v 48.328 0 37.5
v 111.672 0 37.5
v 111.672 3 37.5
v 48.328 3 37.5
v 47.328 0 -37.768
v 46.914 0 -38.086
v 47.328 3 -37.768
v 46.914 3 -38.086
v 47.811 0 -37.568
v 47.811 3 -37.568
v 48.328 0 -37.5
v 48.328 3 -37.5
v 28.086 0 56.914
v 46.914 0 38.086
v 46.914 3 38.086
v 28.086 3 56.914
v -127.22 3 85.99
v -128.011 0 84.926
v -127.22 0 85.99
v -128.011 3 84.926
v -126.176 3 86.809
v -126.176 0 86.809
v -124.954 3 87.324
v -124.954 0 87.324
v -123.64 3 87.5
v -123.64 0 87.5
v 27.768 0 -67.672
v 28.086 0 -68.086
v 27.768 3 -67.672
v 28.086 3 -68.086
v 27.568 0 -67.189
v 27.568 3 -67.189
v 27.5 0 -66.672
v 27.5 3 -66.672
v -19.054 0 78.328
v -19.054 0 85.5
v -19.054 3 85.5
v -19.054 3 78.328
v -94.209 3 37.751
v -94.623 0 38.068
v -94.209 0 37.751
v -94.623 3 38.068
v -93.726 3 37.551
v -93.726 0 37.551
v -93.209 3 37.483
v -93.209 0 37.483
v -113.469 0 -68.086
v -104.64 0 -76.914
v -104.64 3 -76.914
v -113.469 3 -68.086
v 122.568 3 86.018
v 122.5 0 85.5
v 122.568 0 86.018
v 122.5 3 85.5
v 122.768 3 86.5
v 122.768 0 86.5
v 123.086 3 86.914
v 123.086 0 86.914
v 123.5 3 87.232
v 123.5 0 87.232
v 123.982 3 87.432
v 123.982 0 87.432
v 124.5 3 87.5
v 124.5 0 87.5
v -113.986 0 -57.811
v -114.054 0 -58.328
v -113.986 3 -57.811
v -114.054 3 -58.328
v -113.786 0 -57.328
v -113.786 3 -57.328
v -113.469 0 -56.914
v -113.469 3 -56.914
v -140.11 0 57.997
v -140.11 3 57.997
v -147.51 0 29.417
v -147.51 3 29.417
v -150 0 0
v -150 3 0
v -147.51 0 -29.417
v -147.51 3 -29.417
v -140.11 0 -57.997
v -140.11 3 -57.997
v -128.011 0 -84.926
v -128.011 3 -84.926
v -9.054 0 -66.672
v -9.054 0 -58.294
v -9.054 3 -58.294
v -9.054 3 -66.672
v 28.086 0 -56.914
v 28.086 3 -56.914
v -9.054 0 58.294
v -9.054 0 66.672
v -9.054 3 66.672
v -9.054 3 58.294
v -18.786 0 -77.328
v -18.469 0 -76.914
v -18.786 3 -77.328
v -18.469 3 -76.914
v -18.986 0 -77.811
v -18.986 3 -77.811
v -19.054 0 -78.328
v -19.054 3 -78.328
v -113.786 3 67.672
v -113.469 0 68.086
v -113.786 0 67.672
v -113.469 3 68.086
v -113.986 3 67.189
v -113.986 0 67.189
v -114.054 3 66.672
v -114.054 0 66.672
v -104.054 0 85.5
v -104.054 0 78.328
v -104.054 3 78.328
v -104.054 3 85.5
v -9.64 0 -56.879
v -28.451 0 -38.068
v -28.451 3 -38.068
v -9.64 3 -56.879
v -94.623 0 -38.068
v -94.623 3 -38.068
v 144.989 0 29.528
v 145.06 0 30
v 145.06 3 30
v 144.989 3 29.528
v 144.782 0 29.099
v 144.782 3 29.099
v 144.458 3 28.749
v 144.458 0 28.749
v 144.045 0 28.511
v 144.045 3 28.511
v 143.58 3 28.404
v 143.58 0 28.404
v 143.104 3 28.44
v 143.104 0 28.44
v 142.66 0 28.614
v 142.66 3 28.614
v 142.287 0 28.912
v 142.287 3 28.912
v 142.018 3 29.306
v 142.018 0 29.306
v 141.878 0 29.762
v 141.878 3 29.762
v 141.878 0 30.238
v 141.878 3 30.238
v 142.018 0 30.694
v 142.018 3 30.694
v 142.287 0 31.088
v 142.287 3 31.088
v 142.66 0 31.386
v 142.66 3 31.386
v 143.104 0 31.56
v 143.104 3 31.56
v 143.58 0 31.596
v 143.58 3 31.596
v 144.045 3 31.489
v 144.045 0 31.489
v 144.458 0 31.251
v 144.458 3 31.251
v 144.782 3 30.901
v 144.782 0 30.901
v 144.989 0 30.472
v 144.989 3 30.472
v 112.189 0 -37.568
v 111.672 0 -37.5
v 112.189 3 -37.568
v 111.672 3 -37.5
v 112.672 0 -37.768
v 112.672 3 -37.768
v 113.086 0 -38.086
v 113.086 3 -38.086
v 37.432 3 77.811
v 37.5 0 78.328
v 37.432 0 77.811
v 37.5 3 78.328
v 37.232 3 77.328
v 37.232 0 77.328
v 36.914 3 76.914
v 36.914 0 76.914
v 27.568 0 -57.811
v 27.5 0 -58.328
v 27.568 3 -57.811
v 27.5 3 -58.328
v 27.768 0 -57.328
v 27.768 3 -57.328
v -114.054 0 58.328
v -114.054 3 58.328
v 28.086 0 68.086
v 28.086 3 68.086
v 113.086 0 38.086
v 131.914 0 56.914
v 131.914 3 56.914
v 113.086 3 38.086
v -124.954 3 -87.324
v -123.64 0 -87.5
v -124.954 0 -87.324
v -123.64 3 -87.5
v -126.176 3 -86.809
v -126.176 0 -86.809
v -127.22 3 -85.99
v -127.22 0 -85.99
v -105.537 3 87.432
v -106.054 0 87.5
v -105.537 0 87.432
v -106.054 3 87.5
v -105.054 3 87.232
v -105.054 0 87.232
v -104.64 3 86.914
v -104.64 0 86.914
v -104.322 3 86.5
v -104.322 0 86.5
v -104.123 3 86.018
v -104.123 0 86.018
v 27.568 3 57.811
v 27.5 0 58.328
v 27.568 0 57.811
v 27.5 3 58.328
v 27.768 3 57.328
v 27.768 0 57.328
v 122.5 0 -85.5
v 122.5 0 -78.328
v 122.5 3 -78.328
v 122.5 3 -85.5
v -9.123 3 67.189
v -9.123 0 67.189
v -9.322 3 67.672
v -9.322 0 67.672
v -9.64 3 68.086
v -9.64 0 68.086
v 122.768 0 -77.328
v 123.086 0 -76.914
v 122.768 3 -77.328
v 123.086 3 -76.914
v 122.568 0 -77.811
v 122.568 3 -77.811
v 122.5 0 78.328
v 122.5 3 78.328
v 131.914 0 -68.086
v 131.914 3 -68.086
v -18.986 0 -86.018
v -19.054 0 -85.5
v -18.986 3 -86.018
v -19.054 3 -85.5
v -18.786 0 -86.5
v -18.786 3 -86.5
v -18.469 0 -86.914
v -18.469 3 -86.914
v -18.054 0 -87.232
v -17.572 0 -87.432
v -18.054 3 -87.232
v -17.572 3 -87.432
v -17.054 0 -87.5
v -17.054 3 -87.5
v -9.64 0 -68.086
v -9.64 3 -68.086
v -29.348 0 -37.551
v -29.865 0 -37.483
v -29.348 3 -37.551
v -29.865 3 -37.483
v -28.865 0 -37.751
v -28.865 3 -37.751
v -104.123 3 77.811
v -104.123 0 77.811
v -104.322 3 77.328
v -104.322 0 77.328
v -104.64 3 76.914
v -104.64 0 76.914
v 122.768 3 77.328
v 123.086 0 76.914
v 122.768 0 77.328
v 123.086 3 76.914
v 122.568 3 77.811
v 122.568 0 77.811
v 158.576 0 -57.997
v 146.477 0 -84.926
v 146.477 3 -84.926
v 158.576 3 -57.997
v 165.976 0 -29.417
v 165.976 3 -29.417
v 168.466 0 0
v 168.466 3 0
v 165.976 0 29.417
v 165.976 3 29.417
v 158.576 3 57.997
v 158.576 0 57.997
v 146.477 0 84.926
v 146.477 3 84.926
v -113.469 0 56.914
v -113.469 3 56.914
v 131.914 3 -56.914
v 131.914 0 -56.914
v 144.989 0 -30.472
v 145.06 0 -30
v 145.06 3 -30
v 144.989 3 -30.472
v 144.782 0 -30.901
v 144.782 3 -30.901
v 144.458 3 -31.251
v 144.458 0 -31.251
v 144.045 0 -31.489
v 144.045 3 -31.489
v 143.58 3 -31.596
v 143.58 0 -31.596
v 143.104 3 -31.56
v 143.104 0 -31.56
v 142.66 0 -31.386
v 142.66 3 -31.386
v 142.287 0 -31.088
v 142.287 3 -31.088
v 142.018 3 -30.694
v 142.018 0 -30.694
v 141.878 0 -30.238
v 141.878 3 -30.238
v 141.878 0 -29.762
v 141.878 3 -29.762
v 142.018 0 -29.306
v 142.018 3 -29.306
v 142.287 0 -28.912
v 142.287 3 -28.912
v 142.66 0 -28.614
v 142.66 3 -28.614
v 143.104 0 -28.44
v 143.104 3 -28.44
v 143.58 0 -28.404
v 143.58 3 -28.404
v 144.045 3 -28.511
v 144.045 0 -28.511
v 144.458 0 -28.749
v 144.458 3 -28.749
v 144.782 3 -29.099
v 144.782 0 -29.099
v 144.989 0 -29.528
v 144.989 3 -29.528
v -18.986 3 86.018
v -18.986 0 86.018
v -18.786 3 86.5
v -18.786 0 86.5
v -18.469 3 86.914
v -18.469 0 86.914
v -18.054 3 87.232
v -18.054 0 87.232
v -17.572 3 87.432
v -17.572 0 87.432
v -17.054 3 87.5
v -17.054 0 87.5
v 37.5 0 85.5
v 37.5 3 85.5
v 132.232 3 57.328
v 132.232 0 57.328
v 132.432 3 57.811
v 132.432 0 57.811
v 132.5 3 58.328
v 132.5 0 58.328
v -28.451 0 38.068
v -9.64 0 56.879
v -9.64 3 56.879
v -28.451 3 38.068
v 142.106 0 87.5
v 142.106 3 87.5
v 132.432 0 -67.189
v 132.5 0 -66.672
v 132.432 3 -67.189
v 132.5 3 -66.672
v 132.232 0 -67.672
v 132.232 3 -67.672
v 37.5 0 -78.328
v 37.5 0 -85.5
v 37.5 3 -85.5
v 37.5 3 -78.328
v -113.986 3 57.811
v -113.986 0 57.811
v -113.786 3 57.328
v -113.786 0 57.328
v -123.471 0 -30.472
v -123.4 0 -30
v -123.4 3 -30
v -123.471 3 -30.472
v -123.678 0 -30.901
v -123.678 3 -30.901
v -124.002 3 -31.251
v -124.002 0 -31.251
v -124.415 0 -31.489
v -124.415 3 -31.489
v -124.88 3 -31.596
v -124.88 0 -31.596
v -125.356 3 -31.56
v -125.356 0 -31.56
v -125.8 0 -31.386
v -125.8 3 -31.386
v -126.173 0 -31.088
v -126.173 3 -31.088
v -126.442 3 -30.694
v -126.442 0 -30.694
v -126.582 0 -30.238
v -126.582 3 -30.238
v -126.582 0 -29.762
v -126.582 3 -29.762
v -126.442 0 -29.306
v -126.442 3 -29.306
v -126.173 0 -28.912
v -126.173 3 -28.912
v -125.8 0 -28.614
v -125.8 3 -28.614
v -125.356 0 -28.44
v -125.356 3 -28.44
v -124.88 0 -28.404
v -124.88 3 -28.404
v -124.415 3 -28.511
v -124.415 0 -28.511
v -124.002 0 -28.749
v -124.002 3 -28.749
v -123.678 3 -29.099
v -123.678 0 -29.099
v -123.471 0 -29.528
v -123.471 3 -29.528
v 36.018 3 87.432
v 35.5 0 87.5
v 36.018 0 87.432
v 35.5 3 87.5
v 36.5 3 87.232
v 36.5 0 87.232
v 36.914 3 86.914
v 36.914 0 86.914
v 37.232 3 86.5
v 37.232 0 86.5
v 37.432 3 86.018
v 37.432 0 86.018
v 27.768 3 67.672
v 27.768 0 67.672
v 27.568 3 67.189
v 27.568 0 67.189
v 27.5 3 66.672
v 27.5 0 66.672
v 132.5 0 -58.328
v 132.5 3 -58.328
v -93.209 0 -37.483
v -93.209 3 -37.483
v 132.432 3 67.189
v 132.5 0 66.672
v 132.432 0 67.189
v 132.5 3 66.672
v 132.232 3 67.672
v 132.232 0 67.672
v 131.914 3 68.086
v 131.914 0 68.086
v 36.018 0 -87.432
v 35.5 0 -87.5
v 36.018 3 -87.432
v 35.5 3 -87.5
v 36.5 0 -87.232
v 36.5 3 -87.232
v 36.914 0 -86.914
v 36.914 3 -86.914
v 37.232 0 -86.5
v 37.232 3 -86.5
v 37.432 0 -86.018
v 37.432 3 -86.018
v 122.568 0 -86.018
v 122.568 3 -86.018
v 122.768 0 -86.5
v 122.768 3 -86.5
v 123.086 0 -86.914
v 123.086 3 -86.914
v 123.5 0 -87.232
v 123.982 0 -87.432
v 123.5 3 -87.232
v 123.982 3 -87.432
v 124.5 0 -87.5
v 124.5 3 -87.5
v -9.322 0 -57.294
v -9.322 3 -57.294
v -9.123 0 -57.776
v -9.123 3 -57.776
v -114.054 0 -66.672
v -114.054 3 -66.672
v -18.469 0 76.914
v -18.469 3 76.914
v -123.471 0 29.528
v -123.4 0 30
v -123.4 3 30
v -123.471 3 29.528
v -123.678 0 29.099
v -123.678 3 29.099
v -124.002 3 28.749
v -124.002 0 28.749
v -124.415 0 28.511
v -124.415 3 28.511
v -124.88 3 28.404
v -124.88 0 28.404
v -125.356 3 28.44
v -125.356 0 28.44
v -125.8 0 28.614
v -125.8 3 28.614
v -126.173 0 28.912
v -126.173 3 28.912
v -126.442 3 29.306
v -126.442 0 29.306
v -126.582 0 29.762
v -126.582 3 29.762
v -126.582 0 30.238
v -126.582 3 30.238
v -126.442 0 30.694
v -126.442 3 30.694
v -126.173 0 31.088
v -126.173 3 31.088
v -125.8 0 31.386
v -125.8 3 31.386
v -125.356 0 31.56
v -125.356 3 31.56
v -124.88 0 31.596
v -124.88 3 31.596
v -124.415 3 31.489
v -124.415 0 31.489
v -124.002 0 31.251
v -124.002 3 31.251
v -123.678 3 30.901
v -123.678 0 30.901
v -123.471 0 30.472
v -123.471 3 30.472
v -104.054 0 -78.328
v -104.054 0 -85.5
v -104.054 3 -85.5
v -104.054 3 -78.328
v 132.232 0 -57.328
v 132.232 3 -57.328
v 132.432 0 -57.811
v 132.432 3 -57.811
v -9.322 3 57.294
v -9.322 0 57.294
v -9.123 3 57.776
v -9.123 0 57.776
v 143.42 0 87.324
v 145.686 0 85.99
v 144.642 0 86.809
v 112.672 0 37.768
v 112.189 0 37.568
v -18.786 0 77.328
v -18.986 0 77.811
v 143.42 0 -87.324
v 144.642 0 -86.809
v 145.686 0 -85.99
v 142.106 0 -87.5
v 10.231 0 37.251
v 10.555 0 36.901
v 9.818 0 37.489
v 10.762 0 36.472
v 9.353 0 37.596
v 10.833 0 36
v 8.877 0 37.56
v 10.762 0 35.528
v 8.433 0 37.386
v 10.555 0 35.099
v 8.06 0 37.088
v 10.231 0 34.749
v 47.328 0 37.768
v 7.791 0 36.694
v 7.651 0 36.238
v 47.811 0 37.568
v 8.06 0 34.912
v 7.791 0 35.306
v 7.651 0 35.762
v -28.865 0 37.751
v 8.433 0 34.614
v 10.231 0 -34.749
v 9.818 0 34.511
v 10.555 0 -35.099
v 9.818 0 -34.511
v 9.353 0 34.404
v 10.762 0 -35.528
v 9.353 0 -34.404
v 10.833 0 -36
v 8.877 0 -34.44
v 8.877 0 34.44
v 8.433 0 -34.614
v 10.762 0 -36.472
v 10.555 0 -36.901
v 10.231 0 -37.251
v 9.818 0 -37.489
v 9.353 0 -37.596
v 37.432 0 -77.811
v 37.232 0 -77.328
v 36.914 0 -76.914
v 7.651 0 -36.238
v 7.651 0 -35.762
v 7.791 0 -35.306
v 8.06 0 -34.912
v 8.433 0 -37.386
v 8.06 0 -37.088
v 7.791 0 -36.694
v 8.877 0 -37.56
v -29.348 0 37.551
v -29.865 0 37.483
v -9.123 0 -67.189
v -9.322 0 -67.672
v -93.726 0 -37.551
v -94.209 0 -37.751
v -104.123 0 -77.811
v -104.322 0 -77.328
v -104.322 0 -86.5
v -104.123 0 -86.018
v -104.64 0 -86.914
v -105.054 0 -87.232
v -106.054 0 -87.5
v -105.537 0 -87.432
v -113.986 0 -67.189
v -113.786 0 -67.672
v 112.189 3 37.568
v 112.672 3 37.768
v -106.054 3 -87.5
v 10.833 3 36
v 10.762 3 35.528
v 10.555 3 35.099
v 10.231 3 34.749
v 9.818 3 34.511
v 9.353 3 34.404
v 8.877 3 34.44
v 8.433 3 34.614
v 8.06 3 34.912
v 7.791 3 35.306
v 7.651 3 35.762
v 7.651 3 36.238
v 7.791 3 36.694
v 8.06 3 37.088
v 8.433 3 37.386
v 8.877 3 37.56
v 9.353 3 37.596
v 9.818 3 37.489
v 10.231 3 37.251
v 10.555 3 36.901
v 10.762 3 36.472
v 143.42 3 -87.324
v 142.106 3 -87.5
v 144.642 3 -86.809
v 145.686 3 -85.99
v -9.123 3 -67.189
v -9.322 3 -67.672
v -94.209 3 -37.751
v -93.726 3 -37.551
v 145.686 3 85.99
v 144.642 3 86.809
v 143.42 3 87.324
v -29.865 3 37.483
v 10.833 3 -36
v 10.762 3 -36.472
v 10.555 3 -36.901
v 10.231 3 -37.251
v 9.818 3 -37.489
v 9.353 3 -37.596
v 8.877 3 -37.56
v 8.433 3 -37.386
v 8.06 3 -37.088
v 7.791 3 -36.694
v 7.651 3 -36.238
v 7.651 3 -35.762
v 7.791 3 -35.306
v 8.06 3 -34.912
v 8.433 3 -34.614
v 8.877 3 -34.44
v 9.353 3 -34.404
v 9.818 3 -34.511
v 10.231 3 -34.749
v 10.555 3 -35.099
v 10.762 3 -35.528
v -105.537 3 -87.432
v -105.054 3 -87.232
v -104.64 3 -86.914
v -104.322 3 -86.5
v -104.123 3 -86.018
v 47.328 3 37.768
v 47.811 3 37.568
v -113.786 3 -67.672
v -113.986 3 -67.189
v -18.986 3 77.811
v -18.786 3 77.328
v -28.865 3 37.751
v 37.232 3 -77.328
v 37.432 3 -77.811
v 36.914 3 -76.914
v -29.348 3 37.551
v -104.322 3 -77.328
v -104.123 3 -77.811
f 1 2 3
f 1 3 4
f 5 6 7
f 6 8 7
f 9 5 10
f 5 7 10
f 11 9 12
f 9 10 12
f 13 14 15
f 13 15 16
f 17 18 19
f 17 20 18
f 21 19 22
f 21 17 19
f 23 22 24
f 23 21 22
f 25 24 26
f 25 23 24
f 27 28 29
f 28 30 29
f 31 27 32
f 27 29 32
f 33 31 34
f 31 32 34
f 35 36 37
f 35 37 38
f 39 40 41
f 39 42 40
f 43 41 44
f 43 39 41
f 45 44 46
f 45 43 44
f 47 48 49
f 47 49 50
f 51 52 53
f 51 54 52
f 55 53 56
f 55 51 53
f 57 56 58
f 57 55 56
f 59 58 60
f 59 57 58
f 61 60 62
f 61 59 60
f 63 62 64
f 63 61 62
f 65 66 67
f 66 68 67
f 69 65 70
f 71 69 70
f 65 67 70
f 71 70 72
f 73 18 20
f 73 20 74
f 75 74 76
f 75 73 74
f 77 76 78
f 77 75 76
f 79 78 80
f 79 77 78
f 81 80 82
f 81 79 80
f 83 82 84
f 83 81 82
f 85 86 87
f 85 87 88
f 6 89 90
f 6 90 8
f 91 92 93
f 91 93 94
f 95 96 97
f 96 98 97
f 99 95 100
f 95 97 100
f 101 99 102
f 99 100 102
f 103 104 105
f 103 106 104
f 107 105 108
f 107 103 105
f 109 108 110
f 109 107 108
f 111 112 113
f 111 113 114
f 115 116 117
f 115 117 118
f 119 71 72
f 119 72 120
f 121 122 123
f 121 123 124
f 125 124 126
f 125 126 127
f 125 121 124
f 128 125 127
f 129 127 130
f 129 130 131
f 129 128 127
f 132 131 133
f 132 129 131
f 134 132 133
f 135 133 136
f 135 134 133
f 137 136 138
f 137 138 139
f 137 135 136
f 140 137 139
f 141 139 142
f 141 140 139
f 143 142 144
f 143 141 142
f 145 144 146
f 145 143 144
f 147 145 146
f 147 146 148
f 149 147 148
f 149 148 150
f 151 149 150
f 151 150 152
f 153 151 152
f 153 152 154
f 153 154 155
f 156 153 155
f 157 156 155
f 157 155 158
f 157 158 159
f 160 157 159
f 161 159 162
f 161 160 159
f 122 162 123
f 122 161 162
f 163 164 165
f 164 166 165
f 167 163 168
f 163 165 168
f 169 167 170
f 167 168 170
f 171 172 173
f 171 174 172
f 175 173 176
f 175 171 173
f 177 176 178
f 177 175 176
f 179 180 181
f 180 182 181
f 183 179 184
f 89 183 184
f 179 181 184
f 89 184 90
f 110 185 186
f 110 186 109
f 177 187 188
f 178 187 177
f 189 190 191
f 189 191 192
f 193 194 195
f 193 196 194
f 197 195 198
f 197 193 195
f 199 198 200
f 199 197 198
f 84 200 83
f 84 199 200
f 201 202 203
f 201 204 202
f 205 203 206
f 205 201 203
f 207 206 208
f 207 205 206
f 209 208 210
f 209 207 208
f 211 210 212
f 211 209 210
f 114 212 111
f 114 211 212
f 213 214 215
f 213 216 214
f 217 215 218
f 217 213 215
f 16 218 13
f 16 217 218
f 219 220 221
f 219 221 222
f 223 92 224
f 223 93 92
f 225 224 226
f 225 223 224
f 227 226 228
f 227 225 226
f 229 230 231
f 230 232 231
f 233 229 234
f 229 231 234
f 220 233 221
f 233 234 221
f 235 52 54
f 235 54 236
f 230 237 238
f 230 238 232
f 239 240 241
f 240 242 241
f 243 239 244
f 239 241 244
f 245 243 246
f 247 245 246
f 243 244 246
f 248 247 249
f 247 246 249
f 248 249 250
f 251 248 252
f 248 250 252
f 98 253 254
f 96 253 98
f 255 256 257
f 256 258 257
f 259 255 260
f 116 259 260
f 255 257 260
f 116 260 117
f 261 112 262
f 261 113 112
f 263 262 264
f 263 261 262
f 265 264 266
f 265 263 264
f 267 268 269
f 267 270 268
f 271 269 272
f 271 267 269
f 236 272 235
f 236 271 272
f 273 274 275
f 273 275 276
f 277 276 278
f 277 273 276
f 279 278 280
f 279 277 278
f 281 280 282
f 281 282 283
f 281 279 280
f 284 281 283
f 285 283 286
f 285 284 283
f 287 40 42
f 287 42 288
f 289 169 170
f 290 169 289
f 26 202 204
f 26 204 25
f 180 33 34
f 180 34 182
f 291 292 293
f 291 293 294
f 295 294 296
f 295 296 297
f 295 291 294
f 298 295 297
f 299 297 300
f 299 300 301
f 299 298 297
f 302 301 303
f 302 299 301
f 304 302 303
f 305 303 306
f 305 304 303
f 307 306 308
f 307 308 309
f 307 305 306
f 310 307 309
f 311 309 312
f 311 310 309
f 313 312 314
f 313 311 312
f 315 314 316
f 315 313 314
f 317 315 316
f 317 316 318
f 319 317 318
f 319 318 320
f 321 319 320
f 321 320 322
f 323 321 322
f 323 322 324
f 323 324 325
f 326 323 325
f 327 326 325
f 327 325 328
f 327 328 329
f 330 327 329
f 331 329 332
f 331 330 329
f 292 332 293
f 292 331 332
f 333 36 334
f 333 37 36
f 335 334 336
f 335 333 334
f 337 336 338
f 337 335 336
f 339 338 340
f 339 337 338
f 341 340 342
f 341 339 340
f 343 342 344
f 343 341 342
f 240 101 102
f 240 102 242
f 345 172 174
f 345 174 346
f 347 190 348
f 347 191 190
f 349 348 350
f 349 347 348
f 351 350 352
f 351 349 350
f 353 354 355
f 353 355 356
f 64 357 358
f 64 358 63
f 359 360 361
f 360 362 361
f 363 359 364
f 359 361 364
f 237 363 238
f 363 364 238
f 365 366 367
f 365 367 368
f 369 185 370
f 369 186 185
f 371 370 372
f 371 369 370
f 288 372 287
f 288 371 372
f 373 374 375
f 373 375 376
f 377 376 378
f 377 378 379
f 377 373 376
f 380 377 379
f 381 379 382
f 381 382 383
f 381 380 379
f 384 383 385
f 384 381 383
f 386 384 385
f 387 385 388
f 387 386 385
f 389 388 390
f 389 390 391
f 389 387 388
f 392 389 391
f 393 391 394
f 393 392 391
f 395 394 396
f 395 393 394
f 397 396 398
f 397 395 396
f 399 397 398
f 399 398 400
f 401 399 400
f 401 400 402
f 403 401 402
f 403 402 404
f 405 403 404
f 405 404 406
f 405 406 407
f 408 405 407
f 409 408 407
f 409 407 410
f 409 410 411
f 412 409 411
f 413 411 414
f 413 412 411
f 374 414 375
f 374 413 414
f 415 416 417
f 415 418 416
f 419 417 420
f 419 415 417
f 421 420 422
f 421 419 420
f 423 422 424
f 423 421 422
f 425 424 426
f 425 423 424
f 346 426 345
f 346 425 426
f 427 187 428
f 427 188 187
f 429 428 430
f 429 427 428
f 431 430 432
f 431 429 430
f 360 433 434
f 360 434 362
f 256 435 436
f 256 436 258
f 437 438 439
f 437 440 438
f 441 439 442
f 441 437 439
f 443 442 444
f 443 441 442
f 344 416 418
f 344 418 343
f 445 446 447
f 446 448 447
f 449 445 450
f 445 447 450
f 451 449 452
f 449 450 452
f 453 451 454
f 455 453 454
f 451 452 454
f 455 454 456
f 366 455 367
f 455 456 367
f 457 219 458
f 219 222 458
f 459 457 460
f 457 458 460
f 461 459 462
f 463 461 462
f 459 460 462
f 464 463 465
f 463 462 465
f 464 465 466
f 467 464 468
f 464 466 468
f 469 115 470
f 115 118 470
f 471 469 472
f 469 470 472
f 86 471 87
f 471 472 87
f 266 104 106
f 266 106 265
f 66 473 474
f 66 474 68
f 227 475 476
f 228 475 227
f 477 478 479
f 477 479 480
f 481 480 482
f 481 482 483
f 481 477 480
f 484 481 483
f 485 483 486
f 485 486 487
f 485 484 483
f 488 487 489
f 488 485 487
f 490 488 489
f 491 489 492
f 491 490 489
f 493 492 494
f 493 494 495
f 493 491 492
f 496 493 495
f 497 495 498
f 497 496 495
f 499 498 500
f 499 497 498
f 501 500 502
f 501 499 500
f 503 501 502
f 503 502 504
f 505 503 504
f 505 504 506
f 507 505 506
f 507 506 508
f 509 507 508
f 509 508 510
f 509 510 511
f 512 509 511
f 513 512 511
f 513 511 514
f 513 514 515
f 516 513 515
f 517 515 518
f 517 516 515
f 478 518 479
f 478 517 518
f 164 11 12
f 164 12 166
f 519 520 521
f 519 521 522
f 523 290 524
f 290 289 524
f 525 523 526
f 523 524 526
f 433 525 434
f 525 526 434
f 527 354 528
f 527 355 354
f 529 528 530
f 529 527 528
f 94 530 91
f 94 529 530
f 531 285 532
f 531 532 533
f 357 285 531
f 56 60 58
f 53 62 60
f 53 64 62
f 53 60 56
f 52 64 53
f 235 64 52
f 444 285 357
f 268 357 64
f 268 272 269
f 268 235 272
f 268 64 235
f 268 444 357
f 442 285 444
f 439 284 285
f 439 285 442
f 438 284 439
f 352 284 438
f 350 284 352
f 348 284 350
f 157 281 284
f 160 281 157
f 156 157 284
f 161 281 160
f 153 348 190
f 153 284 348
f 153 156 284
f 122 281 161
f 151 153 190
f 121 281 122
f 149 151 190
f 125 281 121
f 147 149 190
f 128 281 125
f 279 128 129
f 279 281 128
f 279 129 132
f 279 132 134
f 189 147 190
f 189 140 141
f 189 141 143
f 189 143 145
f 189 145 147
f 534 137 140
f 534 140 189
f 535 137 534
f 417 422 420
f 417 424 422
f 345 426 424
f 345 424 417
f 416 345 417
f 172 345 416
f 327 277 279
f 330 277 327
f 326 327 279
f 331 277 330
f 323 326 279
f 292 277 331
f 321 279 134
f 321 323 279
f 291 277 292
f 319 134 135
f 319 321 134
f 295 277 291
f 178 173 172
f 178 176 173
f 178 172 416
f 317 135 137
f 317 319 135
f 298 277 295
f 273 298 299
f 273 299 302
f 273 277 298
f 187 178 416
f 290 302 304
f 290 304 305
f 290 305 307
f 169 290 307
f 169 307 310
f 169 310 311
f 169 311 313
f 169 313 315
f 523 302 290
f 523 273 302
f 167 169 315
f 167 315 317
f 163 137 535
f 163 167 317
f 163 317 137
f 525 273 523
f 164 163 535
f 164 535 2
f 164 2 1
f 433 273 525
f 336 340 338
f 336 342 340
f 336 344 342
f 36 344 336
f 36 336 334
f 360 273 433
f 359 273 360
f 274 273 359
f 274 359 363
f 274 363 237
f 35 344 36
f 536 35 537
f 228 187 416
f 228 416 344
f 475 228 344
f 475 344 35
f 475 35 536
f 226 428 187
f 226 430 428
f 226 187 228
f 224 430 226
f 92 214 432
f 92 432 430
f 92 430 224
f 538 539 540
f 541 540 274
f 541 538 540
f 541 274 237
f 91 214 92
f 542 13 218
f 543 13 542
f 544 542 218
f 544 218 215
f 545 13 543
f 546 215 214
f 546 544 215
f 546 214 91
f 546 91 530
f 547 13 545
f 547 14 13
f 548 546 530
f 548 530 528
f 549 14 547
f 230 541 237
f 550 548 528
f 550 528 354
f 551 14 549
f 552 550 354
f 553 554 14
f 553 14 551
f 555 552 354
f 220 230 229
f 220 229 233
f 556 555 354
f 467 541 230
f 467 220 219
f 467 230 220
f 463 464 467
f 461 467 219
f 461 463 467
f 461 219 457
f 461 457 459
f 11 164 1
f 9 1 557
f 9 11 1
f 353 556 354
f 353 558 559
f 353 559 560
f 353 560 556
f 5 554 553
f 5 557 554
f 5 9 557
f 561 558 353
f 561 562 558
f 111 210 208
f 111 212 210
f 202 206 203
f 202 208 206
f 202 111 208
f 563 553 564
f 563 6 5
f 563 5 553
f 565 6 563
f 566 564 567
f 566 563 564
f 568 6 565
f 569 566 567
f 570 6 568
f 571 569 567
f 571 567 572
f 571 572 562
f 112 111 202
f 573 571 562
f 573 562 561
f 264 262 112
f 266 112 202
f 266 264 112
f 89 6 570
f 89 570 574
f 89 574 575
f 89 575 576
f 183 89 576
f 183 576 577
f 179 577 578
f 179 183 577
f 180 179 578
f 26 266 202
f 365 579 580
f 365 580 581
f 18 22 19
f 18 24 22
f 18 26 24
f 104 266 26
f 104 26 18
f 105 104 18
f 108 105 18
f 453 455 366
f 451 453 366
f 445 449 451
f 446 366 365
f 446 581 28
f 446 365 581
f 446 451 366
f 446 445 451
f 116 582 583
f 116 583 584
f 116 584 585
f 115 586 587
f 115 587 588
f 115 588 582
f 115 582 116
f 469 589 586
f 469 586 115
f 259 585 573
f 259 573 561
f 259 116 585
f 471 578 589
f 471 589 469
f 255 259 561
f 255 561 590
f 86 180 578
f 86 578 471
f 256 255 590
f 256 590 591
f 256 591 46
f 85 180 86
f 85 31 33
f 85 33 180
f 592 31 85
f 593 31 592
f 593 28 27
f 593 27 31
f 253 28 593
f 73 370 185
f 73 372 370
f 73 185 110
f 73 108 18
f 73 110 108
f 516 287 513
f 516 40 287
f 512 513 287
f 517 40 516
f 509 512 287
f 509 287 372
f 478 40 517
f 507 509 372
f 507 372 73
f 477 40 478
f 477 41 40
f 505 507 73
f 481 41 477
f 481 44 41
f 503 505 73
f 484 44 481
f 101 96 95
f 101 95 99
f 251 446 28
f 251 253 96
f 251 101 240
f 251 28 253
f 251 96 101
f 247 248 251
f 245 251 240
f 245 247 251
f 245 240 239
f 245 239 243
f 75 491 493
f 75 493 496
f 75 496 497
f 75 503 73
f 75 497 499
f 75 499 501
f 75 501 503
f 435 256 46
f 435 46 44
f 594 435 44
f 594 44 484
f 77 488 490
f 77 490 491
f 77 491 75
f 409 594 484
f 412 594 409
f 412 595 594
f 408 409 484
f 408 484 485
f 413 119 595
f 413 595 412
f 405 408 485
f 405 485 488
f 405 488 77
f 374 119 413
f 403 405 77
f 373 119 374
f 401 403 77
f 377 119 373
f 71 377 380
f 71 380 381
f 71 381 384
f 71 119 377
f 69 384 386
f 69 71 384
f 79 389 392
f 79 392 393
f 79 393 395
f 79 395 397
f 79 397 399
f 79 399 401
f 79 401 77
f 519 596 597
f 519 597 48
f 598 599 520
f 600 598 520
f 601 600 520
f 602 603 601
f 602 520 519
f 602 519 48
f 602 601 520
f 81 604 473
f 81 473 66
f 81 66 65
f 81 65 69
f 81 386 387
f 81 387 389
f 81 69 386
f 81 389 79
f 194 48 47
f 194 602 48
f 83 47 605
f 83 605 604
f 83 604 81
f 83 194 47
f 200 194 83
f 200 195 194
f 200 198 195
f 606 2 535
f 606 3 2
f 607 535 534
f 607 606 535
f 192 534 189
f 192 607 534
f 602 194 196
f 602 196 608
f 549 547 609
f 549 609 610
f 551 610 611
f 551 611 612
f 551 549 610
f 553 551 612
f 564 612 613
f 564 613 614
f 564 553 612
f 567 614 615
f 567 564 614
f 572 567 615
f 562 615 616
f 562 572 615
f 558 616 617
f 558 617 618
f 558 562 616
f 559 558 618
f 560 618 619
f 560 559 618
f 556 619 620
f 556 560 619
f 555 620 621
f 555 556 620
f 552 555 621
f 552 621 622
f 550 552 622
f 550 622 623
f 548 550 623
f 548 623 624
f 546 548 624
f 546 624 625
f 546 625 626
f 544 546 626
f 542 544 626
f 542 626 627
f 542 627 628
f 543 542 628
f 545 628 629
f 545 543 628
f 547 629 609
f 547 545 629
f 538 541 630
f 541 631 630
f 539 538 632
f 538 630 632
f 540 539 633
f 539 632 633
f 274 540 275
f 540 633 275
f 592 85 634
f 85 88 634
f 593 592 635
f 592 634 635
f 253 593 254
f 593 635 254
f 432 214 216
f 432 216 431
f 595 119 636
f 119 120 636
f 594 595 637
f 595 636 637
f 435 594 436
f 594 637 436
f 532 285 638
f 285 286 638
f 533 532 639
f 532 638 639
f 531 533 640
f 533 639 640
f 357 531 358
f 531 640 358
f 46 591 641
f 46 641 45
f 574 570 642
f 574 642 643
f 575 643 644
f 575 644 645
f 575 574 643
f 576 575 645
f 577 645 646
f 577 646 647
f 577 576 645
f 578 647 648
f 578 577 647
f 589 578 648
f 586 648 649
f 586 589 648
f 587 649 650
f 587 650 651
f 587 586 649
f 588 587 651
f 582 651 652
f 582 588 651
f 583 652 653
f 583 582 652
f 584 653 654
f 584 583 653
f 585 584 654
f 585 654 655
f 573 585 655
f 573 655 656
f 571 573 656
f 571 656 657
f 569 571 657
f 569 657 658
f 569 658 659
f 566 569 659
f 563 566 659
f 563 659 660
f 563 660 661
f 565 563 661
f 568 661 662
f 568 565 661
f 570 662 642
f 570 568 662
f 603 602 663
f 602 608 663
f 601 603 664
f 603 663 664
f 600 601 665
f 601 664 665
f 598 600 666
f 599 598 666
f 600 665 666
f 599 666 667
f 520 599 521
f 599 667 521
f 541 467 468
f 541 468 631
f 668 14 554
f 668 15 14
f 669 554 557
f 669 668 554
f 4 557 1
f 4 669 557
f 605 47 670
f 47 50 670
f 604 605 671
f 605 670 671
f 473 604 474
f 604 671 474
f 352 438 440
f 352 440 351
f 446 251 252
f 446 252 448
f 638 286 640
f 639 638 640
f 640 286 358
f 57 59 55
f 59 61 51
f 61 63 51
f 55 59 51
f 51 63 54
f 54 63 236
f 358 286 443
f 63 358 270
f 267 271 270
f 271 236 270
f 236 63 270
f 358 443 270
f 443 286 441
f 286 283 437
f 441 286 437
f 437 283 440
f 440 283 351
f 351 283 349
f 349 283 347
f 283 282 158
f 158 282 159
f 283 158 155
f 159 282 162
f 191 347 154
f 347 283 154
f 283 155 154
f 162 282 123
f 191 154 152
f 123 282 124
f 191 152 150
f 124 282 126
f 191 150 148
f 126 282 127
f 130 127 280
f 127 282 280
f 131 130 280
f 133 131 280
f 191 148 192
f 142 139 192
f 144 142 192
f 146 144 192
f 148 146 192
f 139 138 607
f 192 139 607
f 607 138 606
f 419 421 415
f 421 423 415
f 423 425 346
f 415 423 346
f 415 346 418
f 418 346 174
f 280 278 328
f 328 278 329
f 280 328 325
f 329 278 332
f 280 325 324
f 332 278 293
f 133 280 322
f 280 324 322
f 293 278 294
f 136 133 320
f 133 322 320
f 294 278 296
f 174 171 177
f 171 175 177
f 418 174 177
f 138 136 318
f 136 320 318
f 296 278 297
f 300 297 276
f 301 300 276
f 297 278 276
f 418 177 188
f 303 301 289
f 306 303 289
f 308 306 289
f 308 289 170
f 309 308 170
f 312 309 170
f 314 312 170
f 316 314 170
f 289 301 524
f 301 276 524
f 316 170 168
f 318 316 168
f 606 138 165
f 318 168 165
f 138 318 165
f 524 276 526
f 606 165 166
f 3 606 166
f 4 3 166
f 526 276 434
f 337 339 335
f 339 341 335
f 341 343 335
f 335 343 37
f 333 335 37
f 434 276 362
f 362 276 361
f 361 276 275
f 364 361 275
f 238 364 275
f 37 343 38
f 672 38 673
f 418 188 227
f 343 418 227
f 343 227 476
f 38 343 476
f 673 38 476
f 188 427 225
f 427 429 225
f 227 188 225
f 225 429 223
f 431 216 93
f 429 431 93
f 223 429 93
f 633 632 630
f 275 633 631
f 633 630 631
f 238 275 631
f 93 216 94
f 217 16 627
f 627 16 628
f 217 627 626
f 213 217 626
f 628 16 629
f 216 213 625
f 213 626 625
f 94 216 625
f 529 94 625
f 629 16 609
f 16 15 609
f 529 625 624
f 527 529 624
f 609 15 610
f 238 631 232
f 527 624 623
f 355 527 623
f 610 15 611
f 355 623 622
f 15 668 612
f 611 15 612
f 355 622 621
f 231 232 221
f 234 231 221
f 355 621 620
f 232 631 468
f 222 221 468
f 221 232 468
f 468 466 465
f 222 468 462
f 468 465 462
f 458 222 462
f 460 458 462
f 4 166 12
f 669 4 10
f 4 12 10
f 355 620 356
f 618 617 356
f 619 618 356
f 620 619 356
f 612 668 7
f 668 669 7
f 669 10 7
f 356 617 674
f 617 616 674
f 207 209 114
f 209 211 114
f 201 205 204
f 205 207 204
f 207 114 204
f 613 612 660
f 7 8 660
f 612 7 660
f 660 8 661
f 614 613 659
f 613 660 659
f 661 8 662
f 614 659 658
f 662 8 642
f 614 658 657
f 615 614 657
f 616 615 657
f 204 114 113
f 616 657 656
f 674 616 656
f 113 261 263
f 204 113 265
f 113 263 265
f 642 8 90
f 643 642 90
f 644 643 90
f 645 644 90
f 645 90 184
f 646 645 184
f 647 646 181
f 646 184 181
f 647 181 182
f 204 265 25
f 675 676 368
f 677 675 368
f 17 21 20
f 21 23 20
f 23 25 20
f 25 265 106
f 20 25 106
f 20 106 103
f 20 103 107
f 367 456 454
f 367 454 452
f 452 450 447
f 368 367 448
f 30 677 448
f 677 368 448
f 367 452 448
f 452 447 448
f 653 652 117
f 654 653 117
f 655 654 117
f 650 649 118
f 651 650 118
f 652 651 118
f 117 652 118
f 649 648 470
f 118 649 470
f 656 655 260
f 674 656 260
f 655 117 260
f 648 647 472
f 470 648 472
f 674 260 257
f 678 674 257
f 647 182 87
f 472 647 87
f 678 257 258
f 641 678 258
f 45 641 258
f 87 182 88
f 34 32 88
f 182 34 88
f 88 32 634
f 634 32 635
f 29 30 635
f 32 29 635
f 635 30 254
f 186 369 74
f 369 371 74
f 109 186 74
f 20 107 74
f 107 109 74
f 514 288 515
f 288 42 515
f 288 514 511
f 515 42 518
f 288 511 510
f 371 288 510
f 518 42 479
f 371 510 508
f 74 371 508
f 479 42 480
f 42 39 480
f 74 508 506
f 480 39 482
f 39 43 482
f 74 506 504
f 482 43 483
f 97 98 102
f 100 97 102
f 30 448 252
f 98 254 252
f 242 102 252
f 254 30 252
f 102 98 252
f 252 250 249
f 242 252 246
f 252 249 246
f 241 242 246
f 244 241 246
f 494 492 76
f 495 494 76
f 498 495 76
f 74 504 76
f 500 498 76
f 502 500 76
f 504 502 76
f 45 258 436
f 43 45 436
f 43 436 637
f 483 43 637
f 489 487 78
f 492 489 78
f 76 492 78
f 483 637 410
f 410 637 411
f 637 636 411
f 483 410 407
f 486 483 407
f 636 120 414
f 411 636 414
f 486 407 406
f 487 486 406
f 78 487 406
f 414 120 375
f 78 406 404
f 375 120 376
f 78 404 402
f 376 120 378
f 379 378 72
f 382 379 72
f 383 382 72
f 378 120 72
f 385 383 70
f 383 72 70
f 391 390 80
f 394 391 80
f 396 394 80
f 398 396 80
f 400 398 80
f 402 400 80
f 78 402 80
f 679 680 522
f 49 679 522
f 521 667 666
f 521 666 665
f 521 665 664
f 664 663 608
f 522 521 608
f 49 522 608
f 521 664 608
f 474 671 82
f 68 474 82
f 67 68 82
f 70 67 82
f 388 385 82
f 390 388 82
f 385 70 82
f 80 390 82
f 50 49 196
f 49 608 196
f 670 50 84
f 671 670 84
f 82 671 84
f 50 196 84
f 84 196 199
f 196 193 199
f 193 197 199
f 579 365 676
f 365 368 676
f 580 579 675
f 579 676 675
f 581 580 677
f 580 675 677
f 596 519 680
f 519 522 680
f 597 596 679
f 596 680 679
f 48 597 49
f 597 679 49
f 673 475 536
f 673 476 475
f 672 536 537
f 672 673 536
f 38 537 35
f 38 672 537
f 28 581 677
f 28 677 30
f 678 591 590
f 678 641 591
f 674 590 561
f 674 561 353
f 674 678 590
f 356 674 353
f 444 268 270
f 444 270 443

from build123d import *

# Parameters (mm, degrees)
SKETCH1_R           = 1.6
BOSS_EXTRUDE1_DEPTH = 3
FILLET1_R           = 2
FILLET2_R           = 5


with BuildPart() as part:
    # Sketch1 → Boss-Extrude1 (new body)
    with BuildSketch(Plane(origin=(0, 0, 0), x_dir=(1, 0, 0), z_dir=(0, 1, 0))):
        with BuildLine():
            Line((-126.554445662, 87.5), (-104.054445662, 87.5))
            Line((-104.054445662, 87.5), (-104.054445662, 77.5))
            Line((-104.054445662, 77.5), (-114.054445662, 67.5))
            Line((-114.054445662, 67.5), (-114.054445662, 57.5))
            Line((-114.054445662, 57.5), (-94.037011093, 37.482565431))
            Line((-94.037011093, 37.482565431), (-66.537011093, 37.482565431))
            Line((-66.537011093, 37.482565431), (-56.537011093, 37.482565431))
            Line((-56.537011093, 37.482565431), (-29.037011093, 37.482565431))
            Line((-29.037011093, 37.482565431), (-9.054445662, 57.465130862))
            Line((-9.054445662, 57.465130862), (-9.054445662, 67.5))
            Line((-9.054445662, 67.5), (-19.054445662, 77.5))
            Line((-19.054445662, 77.5), (-19.054445662, 87.5))
            Line((-19.054445662, 87.5), (37.5, 87.5))
            Line((37.5, 87.5), (37.5, 77.5))
            Line((37.5, 77.5), (27.5, 67.5))
            Line((27.5, 67.5), (27.5, 57.5))
            Line((27.5, 57.5), (47.5, 37.5))
            Line((47.5, 37.5), (72.157583055, 37.5))
            Line((72.157583055, 37.5), (87.842416945, 37.5))
            Line((87.842416945, 37.5), (112.5, 37.5))
            Line((112.5, 37.5), (132.5, 57.5))
            Line((132.5, 57.5), (132.5, 67.5))
            Line((132.5, 67.5), (122.5, 77.5))
            Line((122.5, 77.5), (122.5, 87.5))
            Line((122.5, 87.5), (136.956007081, 87.5))
            Line((136.956007081, 87.5), (145.020423476, 87.5))
            ThreePointArc((145.020423476, 87.5), (168.465977814, 0), (145.020423476, -87.5))
            Line((145.020423476, -87.5), (136.956007081, -87.5))
            Line((136.956007081, -87.5), (122.5, -87.5))
            Line((122.5, -87.5), (122.5, -77.5))
            Line((122.5, -77.5), (132.5, -67.5))
            Line((132.5, -67.5), (132.5, -57.5))
            Line((132.5, -57.5), (112.5, -37.5))
            Line((112.5, -37.5), (87.842416945, -37.5))
            Line((87.842416945, -37.5), (72.157583055, -37.5))
            Line((72.157583055, -37.5), (47.5, -37.5))
            Line((47.5, -37.5), (27.5, -57.5))
            Line((27.5, -57.5), (27.5, -67.5))
            Line((27.5, -67.5), (37.5, -77.5))
            Line((37.5, -77.5), (37.5, -87.5))
            Line((37.5, -87.5), (-19.054445662, -87.5))
            Line((-19.054445662, -87.5), (-19.054445662, -77.5))
            Line((-19.054445662, -77.5), (-9.054445662, -67.5))
            Line((-9.054445662, -67.5), (-9.054445662, -57.465130862))
            Line((-9.054445662, -57.465130862), (-29.037011093, -37.482565431))
            Line((-29.037011093, -37.482565431), (-56.537011093, -37.482565431))
            Line((-56.537011093, -37.482565431), (-66.537011093, -37.482565431))
            Line((-66.537011093, -37.482565431), (-94.037011093, -37.482565431))
            Line((-94.037011093, -37.482565431), (-114.054445662, -57.5))
            Line((-114.054445662, -57.5), (-114.054445662, -67.5))
            Line((-114.054445662, -67.5), (-104.054445662, -77.5))
            Line((-104.054445662, -77.5), (-104.054445662, -87.5))
            Line((-104.054445662, -87.5), (-126.554445662, -87.5))
            ThreePointArc((-126.554445662, -87.5), (-150, 0), (-126.554445662, 87.5))
        make_face()
        with Locations((-125, -30)):
            Circle(SKETCH1_R, mode=Mode.SUBTRACT)
        with Locations((9.232988907, -36)):
            Circle(SKETCH1_R, mode=Mode.SUBTRACT)
        with Locations((143.46, -30)):
            Circle(SKETCH1_R, mode=Mode.SUBTRACT)
        with Locations((143.46, 30)):
            Circle(SKETCH1_R, mode=Mode.SUBTRACT)
        with Locations((9.232988907, 36)):
            Circle(SKETCH1_R, mode=Mode.SUBTRACT)
        with Locations((-125, 30)):
            Circle(SKETCH1_R, mode=Mode.SUBTRACT)
    extrude(amount=BOSS_EXTRUDE1_DEPTH)

    # Fillet1
    fillet1_edges = [part.edges().sort_by_distance(p)[0] for p in [
        (-104.054445662, 1.5, 87.5),
        (-104.054445662, 1.5, -87.5),
        (-104.054445662, 1.5, -77.5),
        (-114.054445662, 1.5, -67.5),
        (-114.054445662, 1.5, -57.5),
        (-94.037011093, 1.5, -37.482565431),
        (-29.037011093, 1.5, -37.482565431),
        (-9.054445662, 1.5, -57.465130862),
        (-9.054445662, 1.5, -67.5),
        (-19.054445662, 1.5, -77.5),
        (-19.054445662, 1.5, -87.5),
        (37.5, 1.5, -87.5),
        (37.5, 1.5, -77.5),
        (27.5, 1.5, -67.5),
        (27.5, 1.5, -57.5),
        (47.5, 1.5, -37.5),
        (112.5, 1.5, -37.5),
        (132.5, 1.5, -57.5),
        (132.5, 1.5, -67.5),
        (122.5, 1.5, -77.5),
        (122.5, 1.5, -87.5),
        (122.5, 1.5, 87.5),
        (122.5, 1.5, 77.5),
        (132.5, 1.5, 67.5),
        (132.5, 1.5, 57.5),
        (112.5, 1.5, 37.5),
        (47.5, 1.5, 37.5),
        (27.5, 1.5, 57.5),
        (27.5, 1.5, 67.5),
        (37.5, 1.5, 77.5),
        (37.5, 1.5, 87.5),
        (-19.054445662, 1.5, 87.5),
        (-19.054445662, 1.5, 77.5),
        (-9.054445662, 1.5, 67.5),
        (-9.054445662, 1.5, 57.465130862),
        (-29.037011093, 1.5, 37.482565431),
        (-94.037011093, 1.5, 37.482565431),
        (-114.054445662, 1.5, 57.5),
        (-114.054445662, 1.5, 67.5),
        (-104.054445662, 1.5, 77.5),
    ]]
    fillet(fillet1_edges, radius=FILLET1_R)

    # Fillet2
    fillet2_edges = [part.edges().sort_by_distance(p)[0] for p in [
        (-126.554445662, 1.5, 87.5),
        (-126.554445662, 1.5, -87.5),
        (145.020423476, 1.5, -87.5),
        (145.020423476, 1.5, 87.5),
    ]]
    fillet(fillet2_edges, radius=FILLET2_R)


solid = part.part
